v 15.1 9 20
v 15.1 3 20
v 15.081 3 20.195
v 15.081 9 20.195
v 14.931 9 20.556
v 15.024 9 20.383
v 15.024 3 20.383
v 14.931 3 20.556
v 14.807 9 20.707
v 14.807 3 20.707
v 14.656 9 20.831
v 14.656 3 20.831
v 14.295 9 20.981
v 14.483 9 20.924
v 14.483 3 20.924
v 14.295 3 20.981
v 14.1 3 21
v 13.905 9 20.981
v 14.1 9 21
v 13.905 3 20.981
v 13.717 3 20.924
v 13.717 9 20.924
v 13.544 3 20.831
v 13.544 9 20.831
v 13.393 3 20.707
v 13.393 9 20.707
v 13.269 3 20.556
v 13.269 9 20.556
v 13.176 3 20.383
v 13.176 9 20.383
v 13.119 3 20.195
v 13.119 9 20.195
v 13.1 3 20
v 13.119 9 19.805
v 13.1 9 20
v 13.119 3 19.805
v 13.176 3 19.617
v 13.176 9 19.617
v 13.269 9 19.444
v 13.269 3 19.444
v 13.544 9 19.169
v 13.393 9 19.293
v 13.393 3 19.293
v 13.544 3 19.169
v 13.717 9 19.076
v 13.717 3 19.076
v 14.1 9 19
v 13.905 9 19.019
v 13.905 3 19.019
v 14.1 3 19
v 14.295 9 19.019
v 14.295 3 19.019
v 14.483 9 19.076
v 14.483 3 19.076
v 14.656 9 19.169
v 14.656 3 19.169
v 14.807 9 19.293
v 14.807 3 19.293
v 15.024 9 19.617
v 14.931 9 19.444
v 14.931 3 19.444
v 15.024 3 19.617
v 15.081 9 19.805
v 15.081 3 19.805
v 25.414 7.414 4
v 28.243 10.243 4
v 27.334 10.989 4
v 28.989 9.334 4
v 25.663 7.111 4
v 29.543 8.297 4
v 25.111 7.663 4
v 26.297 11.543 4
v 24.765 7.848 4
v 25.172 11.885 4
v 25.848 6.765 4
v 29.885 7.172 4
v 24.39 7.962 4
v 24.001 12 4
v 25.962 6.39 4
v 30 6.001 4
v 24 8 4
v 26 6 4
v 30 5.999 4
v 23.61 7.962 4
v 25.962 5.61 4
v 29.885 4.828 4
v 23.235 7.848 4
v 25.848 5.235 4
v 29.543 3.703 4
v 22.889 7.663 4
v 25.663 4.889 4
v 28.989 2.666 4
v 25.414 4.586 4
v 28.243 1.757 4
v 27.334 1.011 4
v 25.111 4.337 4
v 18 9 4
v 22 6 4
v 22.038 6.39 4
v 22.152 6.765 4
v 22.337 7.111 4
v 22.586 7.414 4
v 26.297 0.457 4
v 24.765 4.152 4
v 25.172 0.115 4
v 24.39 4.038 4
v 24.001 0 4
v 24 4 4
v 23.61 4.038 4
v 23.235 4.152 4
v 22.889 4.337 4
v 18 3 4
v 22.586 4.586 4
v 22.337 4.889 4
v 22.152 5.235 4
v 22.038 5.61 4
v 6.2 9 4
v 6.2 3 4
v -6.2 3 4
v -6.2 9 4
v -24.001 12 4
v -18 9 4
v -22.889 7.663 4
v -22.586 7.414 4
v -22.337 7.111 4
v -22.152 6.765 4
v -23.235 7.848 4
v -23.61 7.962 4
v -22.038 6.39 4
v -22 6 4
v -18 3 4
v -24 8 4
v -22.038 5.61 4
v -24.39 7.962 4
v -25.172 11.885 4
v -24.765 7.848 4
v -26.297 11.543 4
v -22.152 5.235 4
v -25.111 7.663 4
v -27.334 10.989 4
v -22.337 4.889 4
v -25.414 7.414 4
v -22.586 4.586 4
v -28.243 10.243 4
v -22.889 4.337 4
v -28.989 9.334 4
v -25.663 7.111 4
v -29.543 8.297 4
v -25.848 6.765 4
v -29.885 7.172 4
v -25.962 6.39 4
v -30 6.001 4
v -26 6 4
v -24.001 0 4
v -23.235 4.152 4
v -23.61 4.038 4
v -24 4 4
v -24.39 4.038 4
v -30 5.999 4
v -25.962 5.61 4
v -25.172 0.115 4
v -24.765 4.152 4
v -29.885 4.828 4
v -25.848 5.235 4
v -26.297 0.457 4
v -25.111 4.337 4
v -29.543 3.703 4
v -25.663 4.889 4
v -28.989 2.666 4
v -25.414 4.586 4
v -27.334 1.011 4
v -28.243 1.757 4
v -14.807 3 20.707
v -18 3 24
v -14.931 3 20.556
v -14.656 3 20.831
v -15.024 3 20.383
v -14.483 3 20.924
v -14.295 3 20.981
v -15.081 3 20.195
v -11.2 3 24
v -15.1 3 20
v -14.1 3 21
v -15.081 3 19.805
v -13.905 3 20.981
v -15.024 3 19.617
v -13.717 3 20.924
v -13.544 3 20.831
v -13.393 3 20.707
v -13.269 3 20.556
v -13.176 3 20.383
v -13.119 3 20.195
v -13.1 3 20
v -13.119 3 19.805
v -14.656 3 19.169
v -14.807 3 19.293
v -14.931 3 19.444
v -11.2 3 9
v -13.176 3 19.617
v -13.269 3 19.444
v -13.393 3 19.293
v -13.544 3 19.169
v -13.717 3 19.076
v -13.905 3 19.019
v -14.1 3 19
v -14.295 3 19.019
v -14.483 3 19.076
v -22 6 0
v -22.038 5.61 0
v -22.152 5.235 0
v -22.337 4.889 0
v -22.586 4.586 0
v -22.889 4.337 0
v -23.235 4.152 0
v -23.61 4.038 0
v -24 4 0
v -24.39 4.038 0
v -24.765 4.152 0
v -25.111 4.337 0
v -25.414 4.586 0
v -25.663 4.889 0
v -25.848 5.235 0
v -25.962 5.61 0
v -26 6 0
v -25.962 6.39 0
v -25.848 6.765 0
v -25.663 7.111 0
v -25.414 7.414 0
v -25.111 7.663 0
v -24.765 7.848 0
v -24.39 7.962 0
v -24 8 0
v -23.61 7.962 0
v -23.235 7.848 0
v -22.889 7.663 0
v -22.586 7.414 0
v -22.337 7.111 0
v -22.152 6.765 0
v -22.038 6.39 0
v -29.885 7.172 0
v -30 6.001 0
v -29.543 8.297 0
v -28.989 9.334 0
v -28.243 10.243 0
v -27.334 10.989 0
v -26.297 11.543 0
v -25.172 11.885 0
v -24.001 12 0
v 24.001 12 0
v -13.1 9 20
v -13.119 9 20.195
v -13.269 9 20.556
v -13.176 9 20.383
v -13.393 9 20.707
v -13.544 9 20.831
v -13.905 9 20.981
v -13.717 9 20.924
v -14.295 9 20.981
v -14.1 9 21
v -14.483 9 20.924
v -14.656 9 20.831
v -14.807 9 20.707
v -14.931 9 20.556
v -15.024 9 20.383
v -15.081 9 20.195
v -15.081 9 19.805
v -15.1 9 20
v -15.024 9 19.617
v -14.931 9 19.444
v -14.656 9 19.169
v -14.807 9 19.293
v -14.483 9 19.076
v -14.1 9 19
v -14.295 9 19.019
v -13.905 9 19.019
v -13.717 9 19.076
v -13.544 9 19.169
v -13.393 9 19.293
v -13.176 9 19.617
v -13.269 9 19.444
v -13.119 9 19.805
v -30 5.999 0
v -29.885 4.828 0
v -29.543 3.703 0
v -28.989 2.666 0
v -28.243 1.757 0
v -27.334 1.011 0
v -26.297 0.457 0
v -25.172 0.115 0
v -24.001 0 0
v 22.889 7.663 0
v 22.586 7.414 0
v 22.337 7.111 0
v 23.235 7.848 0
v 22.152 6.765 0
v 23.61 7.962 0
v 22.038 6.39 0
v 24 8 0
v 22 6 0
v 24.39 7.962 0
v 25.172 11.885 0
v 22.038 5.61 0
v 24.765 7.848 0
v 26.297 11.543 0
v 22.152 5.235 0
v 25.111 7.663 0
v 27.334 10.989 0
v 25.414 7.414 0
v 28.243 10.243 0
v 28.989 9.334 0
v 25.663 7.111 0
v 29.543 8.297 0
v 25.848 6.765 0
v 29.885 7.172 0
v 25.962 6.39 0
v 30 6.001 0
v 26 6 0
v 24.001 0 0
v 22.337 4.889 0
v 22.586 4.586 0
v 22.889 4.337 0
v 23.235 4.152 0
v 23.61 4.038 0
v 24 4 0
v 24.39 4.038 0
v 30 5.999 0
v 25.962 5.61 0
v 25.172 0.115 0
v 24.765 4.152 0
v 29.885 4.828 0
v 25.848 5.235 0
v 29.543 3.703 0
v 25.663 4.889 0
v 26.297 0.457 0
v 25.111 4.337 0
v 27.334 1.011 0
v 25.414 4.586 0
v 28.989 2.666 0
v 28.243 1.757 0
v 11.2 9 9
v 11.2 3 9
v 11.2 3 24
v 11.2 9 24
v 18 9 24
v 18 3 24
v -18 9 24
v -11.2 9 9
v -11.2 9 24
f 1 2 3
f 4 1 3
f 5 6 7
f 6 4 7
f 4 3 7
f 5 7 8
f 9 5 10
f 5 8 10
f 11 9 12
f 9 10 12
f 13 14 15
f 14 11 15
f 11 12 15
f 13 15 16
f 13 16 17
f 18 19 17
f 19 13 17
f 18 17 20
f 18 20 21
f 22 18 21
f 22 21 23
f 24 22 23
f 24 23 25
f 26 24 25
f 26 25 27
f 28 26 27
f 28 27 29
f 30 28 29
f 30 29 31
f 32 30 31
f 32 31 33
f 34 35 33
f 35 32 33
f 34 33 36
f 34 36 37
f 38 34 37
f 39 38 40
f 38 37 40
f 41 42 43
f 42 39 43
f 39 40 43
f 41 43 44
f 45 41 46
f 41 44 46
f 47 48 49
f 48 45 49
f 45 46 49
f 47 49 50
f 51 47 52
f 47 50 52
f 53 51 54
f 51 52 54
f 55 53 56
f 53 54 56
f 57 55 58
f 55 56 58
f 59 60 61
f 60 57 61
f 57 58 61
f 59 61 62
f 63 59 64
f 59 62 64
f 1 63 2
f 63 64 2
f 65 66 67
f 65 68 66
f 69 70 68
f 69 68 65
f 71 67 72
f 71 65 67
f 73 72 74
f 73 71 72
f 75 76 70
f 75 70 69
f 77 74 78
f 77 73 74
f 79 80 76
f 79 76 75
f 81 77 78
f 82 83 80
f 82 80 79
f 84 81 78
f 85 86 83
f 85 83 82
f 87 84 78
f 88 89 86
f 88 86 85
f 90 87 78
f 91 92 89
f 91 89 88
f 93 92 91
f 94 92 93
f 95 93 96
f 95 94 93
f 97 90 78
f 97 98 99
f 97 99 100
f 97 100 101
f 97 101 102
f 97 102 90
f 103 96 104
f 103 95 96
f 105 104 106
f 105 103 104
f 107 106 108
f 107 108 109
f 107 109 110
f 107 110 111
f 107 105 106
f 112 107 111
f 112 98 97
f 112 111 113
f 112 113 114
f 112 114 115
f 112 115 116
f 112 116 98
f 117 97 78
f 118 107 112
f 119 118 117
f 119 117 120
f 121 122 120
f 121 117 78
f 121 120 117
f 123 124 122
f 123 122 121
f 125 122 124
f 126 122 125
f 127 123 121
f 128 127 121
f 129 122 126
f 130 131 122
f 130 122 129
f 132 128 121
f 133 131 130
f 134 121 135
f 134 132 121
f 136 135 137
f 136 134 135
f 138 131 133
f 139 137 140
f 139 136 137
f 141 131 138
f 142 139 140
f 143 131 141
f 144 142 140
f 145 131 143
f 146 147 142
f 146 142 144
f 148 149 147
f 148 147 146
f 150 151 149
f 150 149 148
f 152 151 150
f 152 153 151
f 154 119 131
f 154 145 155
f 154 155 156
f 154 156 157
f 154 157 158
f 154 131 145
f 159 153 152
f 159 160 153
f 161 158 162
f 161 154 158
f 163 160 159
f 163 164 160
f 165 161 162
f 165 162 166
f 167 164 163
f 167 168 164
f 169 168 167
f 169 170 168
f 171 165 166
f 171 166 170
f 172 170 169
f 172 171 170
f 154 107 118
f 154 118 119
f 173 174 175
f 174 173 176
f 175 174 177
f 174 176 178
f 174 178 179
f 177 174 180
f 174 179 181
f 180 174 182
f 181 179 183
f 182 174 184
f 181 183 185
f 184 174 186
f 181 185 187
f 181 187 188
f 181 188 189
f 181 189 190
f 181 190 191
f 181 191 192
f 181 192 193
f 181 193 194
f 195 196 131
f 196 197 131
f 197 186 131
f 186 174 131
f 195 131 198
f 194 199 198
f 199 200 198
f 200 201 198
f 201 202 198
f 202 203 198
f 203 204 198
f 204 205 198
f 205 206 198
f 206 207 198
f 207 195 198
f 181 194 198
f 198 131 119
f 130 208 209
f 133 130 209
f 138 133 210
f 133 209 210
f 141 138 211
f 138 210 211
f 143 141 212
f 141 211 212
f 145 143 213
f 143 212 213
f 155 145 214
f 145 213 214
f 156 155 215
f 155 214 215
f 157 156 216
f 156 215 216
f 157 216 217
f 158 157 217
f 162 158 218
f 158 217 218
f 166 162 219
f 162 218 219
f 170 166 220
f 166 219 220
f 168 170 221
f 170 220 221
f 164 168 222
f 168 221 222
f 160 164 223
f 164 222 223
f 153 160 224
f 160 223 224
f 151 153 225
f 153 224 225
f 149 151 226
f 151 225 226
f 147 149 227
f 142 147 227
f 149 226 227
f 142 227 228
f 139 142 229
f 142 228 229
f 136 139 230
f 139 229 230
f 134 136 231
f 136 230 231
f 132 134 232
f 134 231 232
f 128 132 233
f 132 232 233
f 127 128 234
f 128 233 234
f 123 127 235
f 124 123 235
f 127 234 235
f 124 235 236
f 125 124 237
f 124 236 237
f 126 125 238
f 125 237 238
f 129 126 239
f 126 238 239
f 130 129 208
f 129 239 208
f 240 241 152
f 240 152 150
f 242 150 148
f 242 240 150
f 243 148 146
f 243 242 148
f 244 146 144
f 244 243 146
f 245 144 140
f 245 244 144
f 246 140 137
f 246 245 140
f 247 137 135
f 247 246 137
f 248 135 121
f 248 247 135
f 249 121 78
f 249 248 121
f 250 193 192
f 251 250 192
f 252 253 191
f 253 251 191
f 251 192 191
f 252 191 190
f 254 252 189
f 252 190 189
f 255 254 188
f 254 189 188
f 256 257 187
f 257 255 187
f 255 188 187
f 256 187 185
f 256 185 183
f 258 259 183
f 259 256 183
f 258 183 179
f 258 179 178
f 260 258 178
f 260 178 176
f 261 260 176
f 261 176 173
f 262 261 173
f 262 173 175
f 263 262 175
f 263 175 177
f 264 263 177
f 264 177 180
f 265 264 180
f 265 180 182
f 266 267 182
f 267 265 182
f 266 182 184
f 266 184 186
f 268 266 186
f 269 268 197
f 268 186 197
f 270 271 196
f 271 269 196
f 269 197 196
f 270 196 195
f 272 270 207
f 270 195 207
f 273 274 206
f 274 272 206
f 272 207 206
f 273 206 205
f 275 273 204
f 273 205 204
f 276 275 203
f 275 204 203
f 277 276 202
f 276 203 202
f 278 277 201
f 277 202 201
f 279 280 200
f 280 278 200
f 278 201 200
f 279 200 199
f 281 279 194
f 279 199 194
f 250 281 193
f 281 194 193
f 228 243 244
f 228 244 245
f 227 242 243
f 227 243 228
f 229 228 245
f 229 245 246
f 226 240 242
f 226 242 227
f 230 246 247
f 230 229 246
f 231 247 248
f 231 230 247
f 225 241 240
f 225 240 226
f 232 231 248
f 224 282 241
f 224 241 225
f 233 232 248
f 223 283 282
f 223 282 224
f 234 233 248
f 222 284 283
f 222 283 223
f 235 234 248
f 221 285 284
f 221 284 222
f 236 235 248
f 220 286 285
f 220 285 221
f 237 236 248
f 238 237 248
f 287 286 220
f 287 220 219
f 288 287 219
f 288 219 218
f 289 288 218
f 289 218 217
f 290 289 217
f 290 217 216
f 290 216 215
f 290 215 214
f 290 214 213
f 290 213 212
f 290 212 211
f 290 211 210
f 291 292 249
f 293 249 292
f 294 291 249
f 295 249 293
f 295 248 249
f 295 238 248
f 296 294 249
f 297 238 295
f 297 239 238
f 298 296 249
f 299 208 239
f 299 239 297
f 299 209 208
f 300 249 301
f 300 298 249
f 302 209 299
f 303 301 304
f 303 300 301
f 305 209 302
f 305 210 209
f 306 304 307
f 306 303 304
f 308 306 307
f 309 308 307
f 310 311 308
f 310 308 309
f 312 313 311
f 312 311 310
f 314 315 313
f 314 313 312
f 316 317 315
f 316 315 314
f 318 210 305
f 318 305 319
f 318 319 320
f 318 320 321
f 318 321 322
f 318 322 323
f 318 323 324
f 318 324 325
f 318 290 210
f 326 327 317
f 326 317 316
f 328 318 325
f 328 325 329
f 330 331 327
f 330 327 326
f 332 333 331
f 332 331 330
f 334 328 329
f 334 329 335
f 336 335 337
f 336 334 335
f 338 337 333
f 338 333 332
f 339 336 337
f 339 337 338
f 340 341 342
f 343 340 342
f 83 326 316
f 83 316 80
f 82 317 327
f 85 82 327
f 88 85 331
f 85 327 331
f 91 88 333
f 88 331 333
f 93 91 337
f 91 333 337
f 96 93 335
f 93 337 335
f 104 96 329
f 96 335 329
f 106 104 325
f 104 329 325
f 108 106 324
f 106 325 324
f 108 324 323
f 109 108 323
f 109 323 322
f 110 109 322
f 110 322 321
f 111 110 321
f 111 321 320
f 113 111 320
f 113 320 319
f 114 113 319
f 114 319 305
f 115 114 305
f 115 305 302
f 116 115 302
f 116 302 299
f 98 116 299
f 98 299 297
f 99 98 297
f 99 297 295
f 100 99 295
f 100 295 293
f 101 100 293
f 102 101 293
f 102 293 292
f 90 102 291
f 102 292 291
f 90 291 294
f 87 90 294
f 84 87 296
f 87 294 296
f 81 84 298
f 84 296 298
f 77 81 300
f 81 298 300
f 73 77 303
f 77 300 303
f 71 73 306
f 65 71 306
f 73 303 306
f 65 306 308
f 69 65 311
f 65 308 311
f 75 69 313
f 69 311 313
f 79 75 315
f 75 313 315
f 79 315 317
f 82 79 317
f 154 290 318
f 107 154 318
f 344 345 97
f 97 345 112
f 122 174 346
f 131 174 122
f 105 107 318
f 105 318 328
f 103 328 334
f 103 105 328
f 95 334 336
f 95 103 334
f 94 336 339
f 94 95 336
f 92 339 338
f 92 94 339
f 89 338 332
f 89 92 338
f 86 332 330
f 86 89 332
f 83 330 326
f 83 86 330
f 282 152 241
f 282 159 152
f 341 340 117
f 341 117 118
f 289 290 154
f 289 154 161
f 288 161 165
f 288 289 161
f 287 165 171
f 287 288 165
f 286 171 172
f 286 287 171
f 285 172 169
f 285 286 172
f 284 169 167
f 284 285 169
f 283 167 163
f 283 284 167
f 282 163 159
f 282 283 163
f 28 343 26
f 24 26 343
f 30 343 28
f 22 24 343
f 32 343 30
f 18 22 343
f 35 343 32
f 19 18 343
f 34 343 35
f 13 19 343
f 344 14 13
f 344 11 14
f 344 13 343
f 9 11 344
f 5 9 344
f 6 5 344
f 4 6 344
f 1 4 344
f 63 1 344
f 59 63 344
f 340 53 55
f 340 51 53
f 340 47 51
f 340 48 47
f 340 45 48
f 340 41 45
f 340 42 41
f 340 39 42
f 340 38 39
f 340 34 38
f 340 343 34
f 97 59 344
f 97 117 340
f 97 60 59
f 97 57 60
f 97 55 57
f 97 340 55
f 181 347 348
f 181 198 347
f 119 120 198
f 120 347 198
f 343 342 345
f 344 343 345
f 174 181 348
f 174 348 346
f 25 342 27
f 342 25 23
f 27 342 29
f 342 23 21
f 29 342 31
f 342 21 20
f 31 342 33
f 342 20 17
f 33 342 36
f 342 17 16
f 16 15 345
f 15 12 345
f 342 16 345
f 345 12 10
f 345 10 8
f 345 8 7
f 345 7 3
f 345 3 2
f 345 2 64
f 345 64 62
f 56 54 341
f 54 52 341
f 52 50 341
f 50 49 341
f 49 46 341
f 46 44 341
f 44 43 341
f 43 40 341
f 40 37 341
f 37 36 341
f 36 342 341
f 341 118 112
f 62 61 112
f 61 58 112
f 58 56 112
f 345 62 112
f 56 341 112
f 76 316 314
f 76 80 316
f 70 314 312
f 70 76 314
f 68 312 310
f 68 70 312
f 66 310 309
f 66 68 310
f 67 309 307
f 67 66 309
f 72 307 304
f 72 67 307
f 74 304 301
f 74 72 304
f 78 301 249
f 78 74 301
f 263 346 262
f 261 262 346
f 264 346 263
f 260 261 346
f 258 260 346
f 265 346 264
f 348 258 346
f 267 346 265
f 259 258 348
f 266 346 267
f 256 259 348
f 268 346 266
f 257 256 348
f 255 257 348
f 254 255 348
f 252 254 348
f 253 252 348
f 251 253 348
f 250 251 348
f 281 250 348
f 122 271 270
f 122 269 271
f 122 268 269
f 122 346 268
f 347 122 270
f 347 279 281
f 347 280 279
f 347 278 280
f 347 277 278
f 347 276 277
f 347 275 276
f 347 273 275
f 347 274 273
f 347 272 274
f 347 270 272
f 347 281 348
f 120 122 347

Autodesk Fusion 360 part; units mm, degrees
sketch "Sketch1" plane through (0, 0, 0) normal (0, 1, 0) x (1, 0, 0)
  line L0 (-30, 0) -> (30, 0)
  line L1 (30, 0) -> (30, -4)
  line L2 (30, -4) -> (-30, -4)
  line L3 (-30, -4) -> (-30, 0)
  line L4 (-18, -4) -> (-11.2, -4)
  line L5 (-11.2, -4) -> (-11.2, -24)
  line L6 (-11.2, -24) -> (-18, -24)
  line L7 (-18, -24) -> (-18, -4)
  circle A0 centre (-14.1, -20) radius 1
  line L8 (0, -20) -> (0, -2.5)
  line L9 (11.2, -24) -> (18, -24)
  line L10 (11.2, -4) -> (11.2, -24)
  line L11 (18, -24) -> (18, -4)
  circle A1 centre (14.1, -20) radius 1
  dimension "d1" = 4
  dimension "d2" = 60
  dimension "d3" = 6.8
  dimension "d4" = 30
  dimension "d5" = 18
  dimension "d6" = 20
  dimension "d7" = 2
  dimension "d8" = 2.9
  dimension "d9" = 4
  dimension "d10" = 4
extrude "Extrude1" add sketch "Sketch1" along normal blind 12 contours L0 L1 L2 L3 L4
extrude "Extrude2" add sketch "Sketch1" along normal blind 9 and the other way blind -3 contours L2 L4 L5 L6 L7 | L2 L9 L10 L11
chamfer "Chamfer1" distance 5 angle 45 2 edges at (-11.2, 6, 4) (11.2, 6, 4)
sketch "Sketch2" plane through (0, 0, 0) normal (0, 0, 1) x (1, 0, 0)
  circle A0 centre (-24, 6) radius 2
  line L0 (0, 2.5) -> (0, 20)
  circle A1 centre (24, 6) radius 2
  dimension "d18" = 4
  dimension "d19" = 24
  dimension "d20" = 6
extrude "Extrude3" cut sketch "Sketch2" along normal blind 10
fillet "Fillet1" radius 6 4 edges at (-30, 0, 2) (30, 0, 2) (30, 12, 2) (-30, 12, 2)
equation "d4 = d2 / 2"
equation "d10 = d1"
